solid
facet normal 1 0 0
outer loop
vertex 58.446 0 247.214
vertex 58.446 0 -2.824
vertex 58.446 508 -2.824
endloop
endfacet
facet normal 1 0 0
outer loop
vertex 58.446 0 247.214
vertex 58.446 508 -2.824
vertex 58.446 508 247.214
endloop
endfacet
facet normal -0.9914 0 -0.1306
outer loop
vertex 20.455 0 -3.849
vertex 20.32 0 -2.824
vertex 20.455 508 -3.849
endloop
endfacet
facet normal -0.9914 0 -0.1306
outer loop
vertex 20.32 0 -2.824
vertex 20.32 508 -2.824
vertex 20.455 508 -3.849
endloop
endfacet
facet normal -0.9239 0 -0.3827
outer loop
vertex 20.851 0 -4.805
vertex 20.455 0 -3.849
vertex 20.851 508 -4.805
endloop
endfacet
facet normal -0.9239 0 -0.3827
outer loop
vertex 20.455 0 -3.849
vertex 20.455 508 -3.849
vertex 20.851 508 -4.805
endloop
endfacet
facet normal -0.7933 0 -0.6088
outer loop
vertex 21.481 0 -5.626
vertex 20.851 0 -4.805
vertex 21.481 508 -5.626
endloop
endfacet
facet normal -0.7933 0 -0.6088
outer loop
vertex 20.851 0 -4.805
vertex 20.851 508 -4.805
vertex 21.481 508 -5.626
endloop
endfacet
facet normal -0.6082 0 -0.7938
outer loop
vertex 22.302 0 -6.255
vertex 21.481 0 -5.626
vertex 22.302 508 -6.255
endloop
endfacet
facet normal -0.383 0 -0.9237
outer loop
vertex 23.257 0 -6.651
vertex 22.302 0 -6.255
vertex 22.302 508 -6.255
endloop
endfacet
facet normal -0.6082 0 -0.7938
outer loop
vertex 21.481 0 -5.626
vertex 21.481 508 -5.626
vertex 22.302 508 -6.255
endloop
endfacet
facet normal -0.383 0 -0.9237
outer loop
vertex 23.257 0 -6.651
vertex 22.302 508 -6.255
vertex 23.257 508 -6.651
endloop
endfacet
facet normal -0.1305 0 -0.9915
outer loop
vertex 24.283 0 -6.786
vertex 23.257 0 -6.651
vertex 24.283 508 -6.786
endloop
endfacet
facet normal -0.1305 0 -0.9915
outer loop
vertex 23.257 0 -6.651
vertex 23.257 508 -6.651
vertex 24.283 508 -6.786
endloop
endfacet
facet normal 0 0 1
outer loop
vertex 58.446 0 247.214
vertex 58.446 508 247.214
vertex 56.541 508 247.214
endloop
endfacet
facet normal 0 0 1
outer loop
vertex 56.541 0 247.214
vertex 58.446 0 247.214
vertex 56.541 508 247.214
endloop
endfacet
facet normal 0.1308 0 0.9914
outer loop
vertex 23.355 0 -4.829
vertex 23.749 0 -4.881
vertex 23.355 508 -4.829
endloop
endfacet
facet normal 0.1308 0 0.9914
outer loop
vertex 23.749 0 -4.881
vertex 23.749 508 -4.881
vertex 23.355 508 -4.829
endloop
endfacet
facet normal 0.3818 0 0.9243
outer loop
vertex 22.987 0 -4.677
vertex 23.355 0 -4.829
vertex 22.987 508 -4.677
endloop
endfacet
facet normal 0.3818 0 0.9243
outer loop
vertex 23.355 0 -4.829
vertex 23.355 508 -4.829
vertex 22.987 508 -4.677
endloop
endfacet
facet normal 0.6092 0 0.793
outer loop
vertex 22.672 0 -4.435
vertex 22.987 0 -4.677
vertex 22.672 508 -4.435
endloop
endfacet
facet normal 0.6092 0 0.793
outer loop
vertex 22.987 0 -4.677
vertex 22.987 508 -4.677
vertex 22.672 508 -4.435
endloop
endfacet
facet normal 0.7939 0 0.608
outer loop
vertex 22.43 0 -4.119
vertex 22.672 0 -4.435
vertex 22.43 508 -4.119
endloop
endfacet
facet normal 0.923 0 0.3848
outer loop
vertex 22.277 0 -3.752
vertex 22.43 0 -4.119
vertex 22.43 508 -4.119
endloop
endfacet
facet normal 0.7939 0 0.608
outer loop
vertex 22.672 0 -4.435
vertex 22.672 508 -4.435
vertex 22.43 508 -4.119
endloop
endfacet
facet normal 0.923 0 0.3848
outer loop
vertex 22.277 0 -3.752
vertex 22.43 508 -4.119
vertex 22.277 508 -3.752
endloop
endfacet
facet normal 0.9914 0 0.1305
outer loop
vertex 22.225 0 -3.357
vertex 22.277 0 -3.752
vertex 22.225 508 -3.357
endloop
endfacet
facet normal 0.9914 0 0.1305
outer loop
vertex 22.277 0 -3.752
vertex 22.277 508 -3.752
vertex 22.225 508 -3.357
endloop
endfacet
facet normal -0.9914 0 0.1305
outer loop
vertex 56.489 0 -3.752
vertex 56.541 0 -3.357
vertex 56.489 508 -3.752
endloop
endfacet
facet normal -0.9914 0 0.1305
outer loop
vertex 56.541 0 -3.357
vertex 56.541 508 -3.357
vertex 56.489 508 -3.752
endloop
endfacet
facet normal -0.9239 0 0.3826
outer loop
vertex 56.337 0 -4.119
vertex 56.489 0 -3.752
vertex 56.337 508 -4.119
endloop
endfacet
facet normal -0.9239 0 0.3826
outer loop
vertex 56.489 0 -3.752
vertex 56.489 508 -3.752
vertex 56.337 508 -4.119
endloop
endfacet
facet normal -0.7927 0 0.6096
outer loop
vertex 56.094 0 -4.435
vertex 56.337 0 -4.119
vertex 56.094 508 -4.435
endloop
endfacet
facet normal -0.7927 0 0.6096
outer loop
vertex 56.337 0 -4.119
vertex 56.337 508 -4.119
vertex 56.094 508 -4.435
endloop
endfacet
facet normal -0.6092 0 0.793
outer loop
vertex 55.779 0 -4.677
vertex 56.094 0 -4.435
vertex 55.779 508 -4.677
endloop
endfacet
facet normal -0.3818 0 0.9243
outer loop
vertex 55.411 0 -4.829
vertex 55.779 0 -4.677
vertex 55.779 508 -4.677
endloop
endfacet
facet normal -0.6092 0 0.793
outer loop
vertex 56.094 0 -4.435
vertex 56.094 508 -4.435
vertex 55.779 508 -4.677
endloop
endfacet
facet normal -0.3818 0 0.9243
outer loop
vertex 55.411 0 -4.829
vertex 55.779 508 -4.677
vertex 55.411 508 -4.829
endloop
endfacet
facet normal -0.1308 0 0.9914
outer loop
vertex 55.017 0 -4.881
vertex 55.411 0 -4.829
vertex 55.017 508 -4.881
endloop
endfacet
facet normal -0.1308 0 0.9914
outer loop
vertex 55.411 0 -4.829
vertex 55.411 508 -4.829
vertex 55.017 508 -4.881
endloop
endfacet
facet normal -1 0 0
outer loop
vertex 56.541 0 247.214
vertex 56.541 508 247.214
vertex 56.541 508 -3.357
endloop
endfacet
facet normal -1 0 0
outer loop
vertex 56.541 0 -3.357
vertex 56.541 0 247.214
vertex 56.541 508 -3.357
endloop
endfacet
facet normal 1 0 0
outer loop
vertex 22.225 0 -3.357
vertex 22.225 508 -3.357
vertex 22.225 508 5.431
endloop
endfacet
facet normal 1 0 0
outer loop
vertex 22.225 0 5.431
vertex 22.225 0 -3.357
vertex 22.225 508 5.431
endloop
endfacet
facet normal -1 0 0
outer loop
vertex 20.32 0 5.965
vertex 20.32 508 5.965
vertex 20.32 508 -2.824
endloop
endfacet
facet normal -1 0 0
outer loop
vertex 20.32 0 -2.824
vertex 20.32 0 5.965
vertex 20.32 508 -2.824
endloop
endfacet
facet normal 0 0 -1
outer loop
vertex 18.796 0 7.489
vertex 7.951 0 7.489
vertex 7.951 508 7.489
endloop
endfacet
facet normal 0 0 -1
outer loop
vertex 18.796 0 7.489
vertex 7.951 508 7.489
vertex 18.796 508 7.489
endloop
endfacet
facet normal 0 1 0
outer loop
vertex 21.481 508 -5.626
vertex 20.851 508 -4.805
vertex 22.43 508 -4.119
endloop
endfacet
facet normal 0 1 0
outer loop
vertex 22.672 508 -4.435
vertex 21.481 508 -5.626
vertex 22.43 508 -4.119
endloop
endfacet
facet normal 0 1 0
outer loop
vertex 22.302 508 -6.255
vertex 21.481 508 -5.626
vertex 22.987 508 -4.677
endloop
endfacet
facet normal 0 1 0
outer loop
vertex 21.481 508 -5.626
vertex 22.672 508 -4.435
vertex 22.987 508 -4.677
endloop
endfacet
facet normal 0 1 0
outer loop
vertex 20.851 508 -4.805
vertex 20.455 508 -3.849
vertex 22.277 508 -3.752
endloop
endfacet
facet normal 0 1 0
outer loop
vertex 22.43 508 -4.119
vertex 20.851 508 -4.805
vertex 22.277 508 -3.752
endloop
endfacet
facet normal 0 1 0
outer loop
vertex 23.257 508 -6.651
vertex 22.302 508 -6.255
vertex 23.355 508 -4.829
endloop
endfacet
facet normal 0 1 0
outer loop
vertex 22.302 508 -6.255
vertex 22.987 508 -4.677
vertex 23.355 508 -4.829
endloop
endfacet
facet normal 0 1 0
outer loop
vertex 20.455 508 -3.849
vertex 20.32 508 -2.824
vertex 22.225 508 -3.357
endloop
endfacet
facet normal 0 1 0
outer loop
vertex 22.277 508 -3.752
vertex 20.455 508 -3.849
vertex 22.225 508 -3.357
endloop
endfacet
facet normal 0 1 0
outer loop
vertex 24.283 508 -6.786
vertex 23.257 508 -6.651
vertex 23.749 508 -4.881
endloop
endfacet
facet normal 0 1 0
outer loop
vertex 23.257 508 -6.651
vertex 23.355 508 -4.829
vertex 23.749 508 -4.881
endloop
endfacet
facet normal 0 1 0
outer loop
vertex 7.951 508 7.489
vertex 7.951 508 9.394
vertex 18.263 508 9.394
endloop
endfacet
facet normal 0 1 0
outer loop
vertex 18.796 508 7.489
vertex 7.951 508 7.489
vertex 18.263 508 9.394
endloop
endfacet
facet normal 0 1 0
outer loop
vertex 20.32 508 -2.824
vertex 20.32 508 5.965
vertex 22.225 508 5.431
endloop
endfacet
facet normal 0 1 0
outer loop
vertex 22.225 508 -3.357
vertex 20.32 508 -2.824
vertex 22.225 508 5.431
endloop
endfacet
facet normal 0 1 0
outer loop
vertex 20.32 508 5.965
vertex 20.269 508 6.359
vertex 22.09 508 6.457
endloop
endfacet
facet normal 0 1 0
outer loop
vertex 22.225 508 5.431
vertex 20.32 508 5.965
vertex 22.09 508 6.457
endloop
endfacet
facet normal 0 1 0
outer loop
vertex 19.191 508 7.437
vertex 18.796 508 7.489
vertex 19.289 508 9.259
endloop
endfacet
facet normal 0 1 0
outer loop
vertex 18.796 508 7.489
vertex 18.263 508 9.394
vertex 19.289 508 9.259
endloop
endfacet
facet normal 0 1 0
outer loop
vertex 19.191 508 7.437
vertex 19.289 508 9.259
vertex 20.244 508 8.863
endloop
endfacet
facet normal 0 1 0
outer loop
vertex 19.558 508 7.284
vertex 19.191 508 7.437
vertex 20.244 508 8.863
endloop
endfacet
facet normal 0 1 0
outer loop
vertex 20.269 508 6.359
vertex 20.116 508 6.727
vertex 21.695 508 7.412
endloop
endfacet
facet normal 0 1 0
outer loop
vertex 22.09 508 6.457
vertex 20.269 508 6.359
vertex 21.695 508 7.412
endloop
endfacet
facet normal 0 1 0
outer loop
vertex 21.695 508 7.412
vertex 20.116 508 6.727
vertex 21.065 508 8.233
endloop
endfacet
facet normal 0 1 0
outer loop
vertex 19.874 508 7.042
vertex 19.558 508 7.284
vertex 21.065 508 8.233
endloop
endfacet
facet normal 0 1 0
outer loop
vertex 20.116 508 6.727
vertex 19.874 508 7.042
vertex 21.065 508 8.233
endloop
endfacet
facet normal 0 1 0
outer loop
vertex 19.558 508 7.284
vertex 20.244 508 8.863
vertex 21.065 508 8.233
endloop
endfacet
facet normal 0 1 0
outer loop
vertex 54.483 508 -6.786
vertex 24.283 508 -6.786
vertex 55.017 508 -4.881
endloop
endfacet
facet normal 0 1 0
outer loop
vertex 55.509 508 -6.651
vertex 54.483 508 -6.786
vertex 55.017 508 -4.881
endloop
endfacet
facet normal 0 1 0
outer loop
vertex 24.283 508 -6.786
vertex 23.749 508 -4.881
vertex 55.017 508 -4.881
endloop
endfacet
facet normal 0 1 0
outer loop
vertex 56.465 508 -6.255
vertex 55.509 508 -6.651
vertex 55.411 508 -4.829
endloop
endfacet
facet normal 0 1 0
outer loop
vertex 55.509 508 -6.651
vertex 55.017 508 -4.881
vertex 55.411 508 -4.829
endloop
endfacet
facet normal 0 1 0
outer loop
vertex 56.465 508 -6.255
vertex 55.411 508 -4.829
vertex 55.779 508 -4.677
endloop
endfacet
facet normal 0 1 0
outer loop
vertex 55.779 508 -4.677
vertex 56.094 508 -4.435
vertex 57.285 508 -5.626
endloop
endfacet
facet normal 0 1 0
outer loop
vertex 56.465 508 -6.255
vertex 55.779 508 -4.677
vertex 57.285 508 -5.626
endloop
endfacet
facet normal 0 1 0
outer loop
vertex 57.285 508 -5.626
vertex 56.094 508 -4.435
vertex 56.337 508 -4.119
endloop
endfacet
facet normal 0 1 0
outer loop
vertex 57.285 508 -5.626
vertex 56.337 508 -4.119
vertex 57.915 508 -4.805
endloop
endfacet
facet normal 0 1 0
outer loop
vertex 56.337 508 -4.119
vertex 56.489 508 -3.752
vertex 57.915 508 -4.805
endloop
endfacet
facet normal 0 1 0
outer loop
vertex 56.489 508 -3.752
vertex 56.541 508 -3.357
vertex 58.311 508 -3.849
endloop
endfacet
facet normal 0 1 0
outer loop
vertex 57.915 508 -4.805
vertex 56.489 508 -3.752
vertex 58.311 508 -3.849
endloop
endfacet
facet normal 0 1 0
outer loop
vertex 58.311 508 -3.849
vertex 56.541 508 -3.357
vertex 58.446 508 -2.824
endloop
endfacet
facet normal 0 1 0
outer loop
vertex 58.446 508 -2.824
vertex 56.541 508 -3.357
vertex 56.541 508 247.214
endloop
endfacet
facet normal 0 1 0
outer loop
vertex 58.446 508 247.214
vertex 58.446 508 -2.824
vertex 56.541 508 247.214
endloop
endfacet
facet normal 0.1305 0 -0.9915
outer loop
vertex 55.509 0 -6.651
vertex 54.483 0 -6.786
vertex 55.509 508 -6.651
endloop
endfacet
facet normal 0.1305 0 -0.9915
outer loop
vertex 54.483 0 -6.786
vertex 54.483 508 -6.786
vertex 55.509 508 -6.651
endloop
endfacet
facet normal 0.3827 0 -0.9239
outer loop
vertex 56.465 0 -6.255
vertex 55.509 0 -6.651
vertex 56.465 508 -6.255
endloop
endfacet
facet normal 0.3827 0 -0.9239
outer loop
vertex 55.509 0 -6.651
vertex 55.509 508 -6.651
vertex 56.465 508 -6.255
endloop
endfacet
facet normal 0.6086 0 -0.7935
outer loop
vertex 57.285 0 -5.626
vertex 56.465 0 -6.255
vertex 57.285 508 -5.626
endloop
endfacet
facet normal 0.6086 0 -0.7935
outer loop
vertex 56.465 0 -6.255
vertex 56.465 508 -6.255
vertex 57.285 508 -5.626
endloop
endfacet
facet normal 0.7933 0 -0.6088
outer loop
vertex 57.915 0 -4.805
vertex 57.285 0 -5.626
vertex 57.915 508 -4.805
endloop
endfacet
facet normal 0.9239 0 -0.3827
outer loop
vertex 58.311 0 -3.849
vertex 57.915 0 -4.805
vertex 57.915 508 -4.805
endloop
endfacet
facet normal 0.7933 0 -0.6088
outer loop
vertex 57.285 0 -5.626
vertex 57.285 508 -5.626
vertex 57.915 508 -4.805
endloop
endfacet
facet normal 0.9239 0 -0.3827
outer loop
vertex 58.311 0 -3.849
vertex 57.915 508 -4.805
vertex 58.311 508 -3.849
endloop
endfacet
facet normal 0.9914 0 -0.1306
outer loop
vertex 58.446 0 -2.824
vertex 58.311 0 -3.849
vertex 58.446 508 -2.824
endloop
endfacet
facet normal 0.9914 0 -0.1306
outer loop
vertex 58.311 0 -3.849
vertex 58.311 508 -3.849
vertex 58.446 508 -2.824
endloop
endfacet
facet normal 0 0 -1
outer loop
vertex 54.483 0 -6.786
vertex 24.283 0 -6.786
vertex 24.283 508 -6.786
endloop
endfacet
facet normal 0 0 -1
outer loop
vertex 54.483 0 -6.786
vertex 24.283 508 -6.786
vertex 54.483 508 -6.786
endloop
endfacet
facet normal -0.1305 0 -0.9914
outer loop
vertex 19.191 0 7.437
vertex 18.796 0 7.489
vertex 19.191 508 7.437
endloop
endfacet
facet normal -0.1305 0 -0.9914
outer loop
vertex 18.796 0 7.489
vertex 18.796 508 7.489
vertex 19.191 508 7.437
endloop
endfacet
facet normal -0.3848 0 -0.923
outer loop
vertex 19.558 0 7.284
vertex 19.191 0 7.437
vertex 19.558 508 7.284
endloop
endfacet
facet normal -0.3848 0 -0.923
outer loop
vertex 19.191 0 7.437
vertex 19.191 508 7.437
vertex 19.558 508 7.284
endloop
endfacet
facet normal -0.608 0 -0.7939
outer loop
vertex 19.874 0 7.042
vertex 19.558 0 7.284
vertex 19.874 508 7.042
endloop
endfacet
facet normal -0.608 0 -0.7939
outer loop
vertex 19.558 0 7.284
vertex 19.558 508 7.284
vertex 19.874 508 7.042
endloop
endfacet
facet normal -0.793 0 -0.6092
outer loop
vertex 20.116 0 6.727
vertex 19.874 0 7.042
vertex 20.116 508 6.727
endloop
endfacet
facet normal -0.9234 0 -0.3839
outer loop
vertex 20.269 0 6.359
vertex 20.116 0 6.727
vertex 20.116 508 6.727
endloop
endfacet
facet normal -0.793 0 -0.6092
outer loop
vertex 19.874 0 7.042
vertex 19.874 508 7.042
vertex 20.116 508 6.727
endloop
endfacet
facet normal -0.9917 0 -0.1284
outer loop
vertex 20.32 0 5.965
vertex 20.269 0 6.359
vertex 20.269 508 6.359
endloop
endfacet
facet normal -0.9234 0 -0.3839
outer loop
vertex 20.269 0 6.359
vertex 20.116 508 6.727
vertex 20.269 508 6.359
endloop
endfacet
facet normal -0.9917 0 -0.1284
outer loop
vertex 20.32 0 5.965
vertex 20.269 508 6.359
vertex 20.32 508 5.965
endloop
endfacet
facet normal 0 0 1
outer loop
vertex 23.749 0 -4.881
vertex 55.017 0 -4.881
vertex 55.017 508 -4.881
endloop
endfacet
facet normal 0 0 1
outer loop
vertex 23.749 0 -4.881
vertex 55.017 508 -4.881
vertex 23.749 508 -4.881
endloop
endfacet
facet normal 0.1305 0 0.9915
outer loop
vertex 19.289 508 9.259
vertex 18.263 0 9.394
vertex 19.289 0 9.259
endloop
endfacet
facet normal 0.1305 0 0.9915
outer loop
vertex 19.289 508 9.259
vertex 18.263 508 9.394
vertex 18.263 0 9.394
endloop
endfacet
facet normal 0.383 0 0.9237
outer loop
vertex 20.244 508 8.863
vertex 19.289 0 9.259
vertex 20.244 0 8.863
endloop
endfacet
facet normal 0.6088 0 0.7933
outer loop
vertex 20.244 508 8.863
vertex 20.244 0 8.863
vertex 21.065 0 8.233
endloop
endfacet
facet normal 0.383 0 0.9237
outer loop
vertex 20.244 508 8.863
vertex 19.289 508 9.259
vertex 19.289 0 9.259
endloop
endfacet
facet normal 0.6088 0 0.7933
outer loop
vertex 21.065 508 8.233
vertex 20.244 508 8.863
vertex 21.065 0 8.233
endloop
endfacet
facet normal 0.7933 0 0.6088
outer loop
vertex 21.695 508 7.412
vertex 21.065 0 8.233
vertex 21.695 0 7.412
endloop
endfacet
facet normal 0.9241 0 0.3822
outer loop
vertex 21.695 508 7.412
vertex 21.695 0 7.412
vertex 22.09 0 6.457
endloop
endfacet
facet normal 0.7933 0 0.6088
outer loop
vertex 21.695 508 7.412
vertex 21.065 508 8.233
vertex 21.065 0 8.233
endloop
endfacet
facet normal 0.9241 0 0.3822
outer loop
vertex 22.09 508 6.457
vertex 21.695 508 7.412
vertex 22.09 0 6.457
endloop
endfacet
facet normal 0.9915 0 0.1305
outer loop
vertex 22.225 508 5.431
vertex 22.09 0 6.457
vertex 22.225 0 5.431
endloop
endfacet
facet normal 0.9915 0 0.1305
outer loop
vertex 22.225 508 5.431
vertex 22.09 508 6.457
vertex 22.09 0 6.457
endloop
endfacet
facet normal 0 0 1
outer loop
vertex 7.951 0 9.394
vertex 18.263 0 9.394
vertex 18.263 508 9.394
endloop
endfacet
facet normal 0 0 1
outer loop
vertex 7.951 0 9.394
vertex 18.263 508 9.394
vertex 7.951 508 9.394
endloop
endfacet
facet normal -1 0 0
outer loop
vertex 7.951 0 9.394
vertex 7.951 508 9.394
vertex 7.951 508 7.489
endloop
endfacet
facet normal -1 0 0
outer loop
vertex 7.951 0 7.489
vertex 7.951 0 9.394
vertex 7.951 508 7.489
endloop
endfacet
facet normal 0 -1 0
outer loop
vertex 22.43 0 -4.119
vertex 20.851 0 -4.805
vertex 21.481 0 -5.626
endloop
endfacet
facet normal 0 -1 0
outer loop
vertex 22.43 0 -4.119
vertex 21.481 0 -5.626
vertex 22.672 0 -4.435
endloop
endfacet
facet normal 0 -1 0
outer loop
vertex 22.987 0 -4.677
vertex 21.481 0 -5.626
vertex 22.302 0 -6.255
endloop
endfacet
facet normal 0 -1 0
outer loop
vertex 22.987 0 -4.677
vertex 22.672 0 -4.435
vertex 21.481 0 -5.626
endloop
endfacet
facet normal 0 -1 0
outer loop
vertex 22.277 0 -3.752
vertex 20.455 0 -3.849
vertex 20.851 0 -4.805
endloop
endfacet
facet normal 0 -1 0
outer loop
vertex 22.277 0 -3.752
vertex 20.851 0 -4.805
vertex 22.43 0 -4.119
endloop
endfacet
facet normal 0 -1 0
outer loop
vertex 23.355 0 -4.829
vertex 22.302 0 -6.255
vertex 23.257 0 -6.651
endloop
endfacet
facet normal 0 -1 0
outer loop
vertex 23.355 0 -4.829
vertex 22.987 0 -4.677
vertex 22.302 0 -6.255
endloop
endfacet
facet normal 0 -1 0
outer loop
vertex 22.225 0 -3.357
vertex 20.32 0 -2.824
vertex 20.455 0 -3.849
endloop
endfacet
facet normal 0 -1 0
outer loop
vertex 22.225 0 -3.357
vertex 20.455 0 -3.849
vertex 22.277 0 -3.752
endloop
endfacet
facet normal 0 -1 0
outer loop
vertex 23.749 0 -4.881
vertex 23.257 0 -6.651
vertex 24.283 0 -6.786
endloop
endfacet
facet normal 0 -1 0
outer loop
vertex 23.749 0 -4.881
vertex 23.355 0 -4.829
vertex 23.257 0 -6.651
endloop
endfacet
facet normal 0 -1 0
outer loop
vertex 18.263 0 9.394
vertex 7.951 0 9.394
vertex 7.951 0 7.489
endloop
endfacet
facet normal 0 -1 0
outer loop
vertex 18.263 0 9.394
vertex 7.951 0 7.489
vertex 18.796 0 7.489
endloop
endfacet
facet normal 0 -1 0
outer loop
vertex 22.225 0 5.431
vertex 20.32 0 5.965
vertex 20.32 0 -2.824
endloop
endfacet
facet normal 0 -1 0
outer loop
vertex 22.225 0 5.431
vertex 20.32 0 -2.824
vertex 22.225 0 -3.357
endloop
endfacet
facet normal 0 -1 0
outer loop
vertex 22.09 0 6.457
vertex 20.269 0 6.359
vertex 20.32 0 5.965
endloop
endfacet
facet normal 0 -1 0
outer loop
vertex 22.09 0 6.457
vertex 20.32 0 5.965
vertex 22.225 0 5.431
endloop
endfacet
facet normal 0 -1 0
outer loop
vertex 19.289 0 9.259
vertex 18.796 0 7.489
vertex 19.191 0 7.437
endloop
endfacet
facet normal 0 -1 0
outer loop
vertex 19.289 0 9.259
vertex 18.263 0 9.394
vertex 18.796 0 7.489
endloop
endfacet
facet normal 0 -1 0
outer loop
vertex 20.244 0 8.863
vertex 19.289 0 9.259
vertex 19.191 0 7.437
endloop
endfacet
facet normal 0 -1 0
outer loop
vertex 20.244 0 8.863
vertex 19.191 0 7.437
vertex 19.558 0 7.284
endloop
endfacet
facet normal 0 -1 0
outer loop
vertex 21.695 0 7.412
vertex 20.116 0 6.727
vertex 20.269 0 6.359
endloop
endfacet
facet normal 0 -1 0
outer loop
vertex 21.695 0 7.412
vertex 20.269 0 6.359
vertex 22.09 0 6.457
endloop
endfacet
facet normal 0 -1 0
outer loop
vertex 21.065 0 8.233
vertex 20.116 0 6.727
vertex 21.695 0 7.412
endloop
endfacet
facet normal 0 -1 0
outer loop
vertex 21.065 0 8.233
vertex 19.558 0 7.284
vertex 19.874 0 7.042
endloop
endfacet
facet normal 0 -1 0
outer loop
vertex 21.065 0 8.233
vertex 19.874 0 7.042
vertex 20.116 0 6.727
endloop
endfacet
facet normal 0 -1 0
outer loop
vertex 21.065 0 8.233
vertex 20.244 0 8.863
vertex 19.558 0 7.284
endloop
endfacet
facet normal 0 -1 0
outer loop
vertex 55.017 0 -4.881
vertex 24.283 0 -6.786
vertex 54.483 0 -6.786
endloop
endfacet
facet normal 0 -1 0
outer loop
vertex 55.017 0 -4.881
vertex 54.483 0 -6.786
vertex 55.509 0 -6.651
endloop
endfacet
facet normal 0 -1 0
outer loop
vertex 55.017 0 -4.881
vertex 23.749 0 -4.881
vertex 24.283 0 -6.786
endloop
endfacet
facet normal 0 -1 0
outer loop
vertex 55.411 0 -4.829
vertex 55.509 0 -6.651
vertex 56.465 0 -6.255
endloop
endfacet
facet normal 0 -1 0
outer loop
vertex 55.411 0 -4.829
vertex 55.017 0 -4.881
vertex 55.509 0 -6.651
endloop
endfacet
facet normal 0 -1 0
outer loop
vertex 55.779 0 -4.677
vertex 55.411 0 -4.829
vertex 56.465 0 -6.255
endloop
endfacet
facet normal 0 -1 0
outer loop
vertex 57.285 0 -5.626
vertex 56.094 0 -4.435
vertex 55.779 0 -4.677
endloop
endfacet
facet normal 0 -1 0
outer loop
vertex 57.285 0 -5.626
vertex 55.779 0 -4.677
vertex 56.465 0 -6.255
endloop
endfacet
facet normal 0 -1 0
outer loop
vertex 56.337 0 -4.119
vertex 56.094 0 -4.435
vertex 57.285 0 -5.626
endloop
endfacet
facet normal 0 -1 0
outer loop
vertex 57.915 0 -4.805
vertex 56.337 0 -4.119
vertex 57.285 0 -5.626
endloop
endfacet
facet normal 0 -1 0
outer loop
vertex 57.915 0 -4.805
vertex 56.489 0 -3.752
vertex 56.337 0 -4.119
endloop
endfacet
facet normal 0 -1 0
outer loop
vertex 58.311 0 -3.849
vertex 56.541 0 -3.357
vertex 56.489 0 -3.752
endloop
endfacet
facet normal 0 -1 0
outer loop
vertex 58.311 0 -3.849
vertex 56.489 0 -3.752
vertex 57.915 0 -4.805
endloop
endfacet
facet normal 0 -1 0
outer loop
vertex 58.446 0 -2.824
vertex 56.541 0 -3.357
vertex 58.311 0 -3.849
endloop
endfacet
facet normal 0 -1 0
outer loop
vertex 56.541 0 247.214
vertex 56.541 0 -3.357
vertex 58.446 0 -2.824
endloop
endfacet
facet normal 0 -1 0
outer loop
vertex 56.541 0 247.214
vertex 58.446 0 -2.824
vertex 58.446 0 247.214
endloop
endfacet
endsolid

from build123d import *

# Parameters (mm, degrees)
F1_DEPTH = 508
F2_R     = 1.524
F3_R     = 3.9624


with BuildPart() as f1:
    # F0 (on Front) → F1 (new body)
    with BuildSketch(Plane.XZ):
        Polygon((7.950636, 9.393655), (7.950636, 7.488655), (20.320436, 7.488655), (20.320436, -6.786145), (58.445836, -6.786145), (58.445836, 247.213855), (56.540836, 247.213855), (56.540836, -4.881145), (22.225436, -4.881145), (22.225436, 9.393655), align=None)
    extrude(amount=-F1_DEPTH)

    # F2
    f2_edges = [f1.edges().sort_by_distance(p)[0] for p in [
        (20.320436, 254, 7.488655),
        (22.225436, 254, -4.881145),
        (56.540836, 254, -4.881145),
    ]]
    fillet(f2_edges, radius=F2_R)

    # F3
    f3_edges = [f1.edges().sort_by_distance(p)[0] for p in [
        (22.225436, 254, 9.393655),
        (20.320436, 254, -6.786145),
        (58.445836, 254, -6.786145),
    ]]
    fillet(f3_edges, radius=F3_R)


solid = f1.part
